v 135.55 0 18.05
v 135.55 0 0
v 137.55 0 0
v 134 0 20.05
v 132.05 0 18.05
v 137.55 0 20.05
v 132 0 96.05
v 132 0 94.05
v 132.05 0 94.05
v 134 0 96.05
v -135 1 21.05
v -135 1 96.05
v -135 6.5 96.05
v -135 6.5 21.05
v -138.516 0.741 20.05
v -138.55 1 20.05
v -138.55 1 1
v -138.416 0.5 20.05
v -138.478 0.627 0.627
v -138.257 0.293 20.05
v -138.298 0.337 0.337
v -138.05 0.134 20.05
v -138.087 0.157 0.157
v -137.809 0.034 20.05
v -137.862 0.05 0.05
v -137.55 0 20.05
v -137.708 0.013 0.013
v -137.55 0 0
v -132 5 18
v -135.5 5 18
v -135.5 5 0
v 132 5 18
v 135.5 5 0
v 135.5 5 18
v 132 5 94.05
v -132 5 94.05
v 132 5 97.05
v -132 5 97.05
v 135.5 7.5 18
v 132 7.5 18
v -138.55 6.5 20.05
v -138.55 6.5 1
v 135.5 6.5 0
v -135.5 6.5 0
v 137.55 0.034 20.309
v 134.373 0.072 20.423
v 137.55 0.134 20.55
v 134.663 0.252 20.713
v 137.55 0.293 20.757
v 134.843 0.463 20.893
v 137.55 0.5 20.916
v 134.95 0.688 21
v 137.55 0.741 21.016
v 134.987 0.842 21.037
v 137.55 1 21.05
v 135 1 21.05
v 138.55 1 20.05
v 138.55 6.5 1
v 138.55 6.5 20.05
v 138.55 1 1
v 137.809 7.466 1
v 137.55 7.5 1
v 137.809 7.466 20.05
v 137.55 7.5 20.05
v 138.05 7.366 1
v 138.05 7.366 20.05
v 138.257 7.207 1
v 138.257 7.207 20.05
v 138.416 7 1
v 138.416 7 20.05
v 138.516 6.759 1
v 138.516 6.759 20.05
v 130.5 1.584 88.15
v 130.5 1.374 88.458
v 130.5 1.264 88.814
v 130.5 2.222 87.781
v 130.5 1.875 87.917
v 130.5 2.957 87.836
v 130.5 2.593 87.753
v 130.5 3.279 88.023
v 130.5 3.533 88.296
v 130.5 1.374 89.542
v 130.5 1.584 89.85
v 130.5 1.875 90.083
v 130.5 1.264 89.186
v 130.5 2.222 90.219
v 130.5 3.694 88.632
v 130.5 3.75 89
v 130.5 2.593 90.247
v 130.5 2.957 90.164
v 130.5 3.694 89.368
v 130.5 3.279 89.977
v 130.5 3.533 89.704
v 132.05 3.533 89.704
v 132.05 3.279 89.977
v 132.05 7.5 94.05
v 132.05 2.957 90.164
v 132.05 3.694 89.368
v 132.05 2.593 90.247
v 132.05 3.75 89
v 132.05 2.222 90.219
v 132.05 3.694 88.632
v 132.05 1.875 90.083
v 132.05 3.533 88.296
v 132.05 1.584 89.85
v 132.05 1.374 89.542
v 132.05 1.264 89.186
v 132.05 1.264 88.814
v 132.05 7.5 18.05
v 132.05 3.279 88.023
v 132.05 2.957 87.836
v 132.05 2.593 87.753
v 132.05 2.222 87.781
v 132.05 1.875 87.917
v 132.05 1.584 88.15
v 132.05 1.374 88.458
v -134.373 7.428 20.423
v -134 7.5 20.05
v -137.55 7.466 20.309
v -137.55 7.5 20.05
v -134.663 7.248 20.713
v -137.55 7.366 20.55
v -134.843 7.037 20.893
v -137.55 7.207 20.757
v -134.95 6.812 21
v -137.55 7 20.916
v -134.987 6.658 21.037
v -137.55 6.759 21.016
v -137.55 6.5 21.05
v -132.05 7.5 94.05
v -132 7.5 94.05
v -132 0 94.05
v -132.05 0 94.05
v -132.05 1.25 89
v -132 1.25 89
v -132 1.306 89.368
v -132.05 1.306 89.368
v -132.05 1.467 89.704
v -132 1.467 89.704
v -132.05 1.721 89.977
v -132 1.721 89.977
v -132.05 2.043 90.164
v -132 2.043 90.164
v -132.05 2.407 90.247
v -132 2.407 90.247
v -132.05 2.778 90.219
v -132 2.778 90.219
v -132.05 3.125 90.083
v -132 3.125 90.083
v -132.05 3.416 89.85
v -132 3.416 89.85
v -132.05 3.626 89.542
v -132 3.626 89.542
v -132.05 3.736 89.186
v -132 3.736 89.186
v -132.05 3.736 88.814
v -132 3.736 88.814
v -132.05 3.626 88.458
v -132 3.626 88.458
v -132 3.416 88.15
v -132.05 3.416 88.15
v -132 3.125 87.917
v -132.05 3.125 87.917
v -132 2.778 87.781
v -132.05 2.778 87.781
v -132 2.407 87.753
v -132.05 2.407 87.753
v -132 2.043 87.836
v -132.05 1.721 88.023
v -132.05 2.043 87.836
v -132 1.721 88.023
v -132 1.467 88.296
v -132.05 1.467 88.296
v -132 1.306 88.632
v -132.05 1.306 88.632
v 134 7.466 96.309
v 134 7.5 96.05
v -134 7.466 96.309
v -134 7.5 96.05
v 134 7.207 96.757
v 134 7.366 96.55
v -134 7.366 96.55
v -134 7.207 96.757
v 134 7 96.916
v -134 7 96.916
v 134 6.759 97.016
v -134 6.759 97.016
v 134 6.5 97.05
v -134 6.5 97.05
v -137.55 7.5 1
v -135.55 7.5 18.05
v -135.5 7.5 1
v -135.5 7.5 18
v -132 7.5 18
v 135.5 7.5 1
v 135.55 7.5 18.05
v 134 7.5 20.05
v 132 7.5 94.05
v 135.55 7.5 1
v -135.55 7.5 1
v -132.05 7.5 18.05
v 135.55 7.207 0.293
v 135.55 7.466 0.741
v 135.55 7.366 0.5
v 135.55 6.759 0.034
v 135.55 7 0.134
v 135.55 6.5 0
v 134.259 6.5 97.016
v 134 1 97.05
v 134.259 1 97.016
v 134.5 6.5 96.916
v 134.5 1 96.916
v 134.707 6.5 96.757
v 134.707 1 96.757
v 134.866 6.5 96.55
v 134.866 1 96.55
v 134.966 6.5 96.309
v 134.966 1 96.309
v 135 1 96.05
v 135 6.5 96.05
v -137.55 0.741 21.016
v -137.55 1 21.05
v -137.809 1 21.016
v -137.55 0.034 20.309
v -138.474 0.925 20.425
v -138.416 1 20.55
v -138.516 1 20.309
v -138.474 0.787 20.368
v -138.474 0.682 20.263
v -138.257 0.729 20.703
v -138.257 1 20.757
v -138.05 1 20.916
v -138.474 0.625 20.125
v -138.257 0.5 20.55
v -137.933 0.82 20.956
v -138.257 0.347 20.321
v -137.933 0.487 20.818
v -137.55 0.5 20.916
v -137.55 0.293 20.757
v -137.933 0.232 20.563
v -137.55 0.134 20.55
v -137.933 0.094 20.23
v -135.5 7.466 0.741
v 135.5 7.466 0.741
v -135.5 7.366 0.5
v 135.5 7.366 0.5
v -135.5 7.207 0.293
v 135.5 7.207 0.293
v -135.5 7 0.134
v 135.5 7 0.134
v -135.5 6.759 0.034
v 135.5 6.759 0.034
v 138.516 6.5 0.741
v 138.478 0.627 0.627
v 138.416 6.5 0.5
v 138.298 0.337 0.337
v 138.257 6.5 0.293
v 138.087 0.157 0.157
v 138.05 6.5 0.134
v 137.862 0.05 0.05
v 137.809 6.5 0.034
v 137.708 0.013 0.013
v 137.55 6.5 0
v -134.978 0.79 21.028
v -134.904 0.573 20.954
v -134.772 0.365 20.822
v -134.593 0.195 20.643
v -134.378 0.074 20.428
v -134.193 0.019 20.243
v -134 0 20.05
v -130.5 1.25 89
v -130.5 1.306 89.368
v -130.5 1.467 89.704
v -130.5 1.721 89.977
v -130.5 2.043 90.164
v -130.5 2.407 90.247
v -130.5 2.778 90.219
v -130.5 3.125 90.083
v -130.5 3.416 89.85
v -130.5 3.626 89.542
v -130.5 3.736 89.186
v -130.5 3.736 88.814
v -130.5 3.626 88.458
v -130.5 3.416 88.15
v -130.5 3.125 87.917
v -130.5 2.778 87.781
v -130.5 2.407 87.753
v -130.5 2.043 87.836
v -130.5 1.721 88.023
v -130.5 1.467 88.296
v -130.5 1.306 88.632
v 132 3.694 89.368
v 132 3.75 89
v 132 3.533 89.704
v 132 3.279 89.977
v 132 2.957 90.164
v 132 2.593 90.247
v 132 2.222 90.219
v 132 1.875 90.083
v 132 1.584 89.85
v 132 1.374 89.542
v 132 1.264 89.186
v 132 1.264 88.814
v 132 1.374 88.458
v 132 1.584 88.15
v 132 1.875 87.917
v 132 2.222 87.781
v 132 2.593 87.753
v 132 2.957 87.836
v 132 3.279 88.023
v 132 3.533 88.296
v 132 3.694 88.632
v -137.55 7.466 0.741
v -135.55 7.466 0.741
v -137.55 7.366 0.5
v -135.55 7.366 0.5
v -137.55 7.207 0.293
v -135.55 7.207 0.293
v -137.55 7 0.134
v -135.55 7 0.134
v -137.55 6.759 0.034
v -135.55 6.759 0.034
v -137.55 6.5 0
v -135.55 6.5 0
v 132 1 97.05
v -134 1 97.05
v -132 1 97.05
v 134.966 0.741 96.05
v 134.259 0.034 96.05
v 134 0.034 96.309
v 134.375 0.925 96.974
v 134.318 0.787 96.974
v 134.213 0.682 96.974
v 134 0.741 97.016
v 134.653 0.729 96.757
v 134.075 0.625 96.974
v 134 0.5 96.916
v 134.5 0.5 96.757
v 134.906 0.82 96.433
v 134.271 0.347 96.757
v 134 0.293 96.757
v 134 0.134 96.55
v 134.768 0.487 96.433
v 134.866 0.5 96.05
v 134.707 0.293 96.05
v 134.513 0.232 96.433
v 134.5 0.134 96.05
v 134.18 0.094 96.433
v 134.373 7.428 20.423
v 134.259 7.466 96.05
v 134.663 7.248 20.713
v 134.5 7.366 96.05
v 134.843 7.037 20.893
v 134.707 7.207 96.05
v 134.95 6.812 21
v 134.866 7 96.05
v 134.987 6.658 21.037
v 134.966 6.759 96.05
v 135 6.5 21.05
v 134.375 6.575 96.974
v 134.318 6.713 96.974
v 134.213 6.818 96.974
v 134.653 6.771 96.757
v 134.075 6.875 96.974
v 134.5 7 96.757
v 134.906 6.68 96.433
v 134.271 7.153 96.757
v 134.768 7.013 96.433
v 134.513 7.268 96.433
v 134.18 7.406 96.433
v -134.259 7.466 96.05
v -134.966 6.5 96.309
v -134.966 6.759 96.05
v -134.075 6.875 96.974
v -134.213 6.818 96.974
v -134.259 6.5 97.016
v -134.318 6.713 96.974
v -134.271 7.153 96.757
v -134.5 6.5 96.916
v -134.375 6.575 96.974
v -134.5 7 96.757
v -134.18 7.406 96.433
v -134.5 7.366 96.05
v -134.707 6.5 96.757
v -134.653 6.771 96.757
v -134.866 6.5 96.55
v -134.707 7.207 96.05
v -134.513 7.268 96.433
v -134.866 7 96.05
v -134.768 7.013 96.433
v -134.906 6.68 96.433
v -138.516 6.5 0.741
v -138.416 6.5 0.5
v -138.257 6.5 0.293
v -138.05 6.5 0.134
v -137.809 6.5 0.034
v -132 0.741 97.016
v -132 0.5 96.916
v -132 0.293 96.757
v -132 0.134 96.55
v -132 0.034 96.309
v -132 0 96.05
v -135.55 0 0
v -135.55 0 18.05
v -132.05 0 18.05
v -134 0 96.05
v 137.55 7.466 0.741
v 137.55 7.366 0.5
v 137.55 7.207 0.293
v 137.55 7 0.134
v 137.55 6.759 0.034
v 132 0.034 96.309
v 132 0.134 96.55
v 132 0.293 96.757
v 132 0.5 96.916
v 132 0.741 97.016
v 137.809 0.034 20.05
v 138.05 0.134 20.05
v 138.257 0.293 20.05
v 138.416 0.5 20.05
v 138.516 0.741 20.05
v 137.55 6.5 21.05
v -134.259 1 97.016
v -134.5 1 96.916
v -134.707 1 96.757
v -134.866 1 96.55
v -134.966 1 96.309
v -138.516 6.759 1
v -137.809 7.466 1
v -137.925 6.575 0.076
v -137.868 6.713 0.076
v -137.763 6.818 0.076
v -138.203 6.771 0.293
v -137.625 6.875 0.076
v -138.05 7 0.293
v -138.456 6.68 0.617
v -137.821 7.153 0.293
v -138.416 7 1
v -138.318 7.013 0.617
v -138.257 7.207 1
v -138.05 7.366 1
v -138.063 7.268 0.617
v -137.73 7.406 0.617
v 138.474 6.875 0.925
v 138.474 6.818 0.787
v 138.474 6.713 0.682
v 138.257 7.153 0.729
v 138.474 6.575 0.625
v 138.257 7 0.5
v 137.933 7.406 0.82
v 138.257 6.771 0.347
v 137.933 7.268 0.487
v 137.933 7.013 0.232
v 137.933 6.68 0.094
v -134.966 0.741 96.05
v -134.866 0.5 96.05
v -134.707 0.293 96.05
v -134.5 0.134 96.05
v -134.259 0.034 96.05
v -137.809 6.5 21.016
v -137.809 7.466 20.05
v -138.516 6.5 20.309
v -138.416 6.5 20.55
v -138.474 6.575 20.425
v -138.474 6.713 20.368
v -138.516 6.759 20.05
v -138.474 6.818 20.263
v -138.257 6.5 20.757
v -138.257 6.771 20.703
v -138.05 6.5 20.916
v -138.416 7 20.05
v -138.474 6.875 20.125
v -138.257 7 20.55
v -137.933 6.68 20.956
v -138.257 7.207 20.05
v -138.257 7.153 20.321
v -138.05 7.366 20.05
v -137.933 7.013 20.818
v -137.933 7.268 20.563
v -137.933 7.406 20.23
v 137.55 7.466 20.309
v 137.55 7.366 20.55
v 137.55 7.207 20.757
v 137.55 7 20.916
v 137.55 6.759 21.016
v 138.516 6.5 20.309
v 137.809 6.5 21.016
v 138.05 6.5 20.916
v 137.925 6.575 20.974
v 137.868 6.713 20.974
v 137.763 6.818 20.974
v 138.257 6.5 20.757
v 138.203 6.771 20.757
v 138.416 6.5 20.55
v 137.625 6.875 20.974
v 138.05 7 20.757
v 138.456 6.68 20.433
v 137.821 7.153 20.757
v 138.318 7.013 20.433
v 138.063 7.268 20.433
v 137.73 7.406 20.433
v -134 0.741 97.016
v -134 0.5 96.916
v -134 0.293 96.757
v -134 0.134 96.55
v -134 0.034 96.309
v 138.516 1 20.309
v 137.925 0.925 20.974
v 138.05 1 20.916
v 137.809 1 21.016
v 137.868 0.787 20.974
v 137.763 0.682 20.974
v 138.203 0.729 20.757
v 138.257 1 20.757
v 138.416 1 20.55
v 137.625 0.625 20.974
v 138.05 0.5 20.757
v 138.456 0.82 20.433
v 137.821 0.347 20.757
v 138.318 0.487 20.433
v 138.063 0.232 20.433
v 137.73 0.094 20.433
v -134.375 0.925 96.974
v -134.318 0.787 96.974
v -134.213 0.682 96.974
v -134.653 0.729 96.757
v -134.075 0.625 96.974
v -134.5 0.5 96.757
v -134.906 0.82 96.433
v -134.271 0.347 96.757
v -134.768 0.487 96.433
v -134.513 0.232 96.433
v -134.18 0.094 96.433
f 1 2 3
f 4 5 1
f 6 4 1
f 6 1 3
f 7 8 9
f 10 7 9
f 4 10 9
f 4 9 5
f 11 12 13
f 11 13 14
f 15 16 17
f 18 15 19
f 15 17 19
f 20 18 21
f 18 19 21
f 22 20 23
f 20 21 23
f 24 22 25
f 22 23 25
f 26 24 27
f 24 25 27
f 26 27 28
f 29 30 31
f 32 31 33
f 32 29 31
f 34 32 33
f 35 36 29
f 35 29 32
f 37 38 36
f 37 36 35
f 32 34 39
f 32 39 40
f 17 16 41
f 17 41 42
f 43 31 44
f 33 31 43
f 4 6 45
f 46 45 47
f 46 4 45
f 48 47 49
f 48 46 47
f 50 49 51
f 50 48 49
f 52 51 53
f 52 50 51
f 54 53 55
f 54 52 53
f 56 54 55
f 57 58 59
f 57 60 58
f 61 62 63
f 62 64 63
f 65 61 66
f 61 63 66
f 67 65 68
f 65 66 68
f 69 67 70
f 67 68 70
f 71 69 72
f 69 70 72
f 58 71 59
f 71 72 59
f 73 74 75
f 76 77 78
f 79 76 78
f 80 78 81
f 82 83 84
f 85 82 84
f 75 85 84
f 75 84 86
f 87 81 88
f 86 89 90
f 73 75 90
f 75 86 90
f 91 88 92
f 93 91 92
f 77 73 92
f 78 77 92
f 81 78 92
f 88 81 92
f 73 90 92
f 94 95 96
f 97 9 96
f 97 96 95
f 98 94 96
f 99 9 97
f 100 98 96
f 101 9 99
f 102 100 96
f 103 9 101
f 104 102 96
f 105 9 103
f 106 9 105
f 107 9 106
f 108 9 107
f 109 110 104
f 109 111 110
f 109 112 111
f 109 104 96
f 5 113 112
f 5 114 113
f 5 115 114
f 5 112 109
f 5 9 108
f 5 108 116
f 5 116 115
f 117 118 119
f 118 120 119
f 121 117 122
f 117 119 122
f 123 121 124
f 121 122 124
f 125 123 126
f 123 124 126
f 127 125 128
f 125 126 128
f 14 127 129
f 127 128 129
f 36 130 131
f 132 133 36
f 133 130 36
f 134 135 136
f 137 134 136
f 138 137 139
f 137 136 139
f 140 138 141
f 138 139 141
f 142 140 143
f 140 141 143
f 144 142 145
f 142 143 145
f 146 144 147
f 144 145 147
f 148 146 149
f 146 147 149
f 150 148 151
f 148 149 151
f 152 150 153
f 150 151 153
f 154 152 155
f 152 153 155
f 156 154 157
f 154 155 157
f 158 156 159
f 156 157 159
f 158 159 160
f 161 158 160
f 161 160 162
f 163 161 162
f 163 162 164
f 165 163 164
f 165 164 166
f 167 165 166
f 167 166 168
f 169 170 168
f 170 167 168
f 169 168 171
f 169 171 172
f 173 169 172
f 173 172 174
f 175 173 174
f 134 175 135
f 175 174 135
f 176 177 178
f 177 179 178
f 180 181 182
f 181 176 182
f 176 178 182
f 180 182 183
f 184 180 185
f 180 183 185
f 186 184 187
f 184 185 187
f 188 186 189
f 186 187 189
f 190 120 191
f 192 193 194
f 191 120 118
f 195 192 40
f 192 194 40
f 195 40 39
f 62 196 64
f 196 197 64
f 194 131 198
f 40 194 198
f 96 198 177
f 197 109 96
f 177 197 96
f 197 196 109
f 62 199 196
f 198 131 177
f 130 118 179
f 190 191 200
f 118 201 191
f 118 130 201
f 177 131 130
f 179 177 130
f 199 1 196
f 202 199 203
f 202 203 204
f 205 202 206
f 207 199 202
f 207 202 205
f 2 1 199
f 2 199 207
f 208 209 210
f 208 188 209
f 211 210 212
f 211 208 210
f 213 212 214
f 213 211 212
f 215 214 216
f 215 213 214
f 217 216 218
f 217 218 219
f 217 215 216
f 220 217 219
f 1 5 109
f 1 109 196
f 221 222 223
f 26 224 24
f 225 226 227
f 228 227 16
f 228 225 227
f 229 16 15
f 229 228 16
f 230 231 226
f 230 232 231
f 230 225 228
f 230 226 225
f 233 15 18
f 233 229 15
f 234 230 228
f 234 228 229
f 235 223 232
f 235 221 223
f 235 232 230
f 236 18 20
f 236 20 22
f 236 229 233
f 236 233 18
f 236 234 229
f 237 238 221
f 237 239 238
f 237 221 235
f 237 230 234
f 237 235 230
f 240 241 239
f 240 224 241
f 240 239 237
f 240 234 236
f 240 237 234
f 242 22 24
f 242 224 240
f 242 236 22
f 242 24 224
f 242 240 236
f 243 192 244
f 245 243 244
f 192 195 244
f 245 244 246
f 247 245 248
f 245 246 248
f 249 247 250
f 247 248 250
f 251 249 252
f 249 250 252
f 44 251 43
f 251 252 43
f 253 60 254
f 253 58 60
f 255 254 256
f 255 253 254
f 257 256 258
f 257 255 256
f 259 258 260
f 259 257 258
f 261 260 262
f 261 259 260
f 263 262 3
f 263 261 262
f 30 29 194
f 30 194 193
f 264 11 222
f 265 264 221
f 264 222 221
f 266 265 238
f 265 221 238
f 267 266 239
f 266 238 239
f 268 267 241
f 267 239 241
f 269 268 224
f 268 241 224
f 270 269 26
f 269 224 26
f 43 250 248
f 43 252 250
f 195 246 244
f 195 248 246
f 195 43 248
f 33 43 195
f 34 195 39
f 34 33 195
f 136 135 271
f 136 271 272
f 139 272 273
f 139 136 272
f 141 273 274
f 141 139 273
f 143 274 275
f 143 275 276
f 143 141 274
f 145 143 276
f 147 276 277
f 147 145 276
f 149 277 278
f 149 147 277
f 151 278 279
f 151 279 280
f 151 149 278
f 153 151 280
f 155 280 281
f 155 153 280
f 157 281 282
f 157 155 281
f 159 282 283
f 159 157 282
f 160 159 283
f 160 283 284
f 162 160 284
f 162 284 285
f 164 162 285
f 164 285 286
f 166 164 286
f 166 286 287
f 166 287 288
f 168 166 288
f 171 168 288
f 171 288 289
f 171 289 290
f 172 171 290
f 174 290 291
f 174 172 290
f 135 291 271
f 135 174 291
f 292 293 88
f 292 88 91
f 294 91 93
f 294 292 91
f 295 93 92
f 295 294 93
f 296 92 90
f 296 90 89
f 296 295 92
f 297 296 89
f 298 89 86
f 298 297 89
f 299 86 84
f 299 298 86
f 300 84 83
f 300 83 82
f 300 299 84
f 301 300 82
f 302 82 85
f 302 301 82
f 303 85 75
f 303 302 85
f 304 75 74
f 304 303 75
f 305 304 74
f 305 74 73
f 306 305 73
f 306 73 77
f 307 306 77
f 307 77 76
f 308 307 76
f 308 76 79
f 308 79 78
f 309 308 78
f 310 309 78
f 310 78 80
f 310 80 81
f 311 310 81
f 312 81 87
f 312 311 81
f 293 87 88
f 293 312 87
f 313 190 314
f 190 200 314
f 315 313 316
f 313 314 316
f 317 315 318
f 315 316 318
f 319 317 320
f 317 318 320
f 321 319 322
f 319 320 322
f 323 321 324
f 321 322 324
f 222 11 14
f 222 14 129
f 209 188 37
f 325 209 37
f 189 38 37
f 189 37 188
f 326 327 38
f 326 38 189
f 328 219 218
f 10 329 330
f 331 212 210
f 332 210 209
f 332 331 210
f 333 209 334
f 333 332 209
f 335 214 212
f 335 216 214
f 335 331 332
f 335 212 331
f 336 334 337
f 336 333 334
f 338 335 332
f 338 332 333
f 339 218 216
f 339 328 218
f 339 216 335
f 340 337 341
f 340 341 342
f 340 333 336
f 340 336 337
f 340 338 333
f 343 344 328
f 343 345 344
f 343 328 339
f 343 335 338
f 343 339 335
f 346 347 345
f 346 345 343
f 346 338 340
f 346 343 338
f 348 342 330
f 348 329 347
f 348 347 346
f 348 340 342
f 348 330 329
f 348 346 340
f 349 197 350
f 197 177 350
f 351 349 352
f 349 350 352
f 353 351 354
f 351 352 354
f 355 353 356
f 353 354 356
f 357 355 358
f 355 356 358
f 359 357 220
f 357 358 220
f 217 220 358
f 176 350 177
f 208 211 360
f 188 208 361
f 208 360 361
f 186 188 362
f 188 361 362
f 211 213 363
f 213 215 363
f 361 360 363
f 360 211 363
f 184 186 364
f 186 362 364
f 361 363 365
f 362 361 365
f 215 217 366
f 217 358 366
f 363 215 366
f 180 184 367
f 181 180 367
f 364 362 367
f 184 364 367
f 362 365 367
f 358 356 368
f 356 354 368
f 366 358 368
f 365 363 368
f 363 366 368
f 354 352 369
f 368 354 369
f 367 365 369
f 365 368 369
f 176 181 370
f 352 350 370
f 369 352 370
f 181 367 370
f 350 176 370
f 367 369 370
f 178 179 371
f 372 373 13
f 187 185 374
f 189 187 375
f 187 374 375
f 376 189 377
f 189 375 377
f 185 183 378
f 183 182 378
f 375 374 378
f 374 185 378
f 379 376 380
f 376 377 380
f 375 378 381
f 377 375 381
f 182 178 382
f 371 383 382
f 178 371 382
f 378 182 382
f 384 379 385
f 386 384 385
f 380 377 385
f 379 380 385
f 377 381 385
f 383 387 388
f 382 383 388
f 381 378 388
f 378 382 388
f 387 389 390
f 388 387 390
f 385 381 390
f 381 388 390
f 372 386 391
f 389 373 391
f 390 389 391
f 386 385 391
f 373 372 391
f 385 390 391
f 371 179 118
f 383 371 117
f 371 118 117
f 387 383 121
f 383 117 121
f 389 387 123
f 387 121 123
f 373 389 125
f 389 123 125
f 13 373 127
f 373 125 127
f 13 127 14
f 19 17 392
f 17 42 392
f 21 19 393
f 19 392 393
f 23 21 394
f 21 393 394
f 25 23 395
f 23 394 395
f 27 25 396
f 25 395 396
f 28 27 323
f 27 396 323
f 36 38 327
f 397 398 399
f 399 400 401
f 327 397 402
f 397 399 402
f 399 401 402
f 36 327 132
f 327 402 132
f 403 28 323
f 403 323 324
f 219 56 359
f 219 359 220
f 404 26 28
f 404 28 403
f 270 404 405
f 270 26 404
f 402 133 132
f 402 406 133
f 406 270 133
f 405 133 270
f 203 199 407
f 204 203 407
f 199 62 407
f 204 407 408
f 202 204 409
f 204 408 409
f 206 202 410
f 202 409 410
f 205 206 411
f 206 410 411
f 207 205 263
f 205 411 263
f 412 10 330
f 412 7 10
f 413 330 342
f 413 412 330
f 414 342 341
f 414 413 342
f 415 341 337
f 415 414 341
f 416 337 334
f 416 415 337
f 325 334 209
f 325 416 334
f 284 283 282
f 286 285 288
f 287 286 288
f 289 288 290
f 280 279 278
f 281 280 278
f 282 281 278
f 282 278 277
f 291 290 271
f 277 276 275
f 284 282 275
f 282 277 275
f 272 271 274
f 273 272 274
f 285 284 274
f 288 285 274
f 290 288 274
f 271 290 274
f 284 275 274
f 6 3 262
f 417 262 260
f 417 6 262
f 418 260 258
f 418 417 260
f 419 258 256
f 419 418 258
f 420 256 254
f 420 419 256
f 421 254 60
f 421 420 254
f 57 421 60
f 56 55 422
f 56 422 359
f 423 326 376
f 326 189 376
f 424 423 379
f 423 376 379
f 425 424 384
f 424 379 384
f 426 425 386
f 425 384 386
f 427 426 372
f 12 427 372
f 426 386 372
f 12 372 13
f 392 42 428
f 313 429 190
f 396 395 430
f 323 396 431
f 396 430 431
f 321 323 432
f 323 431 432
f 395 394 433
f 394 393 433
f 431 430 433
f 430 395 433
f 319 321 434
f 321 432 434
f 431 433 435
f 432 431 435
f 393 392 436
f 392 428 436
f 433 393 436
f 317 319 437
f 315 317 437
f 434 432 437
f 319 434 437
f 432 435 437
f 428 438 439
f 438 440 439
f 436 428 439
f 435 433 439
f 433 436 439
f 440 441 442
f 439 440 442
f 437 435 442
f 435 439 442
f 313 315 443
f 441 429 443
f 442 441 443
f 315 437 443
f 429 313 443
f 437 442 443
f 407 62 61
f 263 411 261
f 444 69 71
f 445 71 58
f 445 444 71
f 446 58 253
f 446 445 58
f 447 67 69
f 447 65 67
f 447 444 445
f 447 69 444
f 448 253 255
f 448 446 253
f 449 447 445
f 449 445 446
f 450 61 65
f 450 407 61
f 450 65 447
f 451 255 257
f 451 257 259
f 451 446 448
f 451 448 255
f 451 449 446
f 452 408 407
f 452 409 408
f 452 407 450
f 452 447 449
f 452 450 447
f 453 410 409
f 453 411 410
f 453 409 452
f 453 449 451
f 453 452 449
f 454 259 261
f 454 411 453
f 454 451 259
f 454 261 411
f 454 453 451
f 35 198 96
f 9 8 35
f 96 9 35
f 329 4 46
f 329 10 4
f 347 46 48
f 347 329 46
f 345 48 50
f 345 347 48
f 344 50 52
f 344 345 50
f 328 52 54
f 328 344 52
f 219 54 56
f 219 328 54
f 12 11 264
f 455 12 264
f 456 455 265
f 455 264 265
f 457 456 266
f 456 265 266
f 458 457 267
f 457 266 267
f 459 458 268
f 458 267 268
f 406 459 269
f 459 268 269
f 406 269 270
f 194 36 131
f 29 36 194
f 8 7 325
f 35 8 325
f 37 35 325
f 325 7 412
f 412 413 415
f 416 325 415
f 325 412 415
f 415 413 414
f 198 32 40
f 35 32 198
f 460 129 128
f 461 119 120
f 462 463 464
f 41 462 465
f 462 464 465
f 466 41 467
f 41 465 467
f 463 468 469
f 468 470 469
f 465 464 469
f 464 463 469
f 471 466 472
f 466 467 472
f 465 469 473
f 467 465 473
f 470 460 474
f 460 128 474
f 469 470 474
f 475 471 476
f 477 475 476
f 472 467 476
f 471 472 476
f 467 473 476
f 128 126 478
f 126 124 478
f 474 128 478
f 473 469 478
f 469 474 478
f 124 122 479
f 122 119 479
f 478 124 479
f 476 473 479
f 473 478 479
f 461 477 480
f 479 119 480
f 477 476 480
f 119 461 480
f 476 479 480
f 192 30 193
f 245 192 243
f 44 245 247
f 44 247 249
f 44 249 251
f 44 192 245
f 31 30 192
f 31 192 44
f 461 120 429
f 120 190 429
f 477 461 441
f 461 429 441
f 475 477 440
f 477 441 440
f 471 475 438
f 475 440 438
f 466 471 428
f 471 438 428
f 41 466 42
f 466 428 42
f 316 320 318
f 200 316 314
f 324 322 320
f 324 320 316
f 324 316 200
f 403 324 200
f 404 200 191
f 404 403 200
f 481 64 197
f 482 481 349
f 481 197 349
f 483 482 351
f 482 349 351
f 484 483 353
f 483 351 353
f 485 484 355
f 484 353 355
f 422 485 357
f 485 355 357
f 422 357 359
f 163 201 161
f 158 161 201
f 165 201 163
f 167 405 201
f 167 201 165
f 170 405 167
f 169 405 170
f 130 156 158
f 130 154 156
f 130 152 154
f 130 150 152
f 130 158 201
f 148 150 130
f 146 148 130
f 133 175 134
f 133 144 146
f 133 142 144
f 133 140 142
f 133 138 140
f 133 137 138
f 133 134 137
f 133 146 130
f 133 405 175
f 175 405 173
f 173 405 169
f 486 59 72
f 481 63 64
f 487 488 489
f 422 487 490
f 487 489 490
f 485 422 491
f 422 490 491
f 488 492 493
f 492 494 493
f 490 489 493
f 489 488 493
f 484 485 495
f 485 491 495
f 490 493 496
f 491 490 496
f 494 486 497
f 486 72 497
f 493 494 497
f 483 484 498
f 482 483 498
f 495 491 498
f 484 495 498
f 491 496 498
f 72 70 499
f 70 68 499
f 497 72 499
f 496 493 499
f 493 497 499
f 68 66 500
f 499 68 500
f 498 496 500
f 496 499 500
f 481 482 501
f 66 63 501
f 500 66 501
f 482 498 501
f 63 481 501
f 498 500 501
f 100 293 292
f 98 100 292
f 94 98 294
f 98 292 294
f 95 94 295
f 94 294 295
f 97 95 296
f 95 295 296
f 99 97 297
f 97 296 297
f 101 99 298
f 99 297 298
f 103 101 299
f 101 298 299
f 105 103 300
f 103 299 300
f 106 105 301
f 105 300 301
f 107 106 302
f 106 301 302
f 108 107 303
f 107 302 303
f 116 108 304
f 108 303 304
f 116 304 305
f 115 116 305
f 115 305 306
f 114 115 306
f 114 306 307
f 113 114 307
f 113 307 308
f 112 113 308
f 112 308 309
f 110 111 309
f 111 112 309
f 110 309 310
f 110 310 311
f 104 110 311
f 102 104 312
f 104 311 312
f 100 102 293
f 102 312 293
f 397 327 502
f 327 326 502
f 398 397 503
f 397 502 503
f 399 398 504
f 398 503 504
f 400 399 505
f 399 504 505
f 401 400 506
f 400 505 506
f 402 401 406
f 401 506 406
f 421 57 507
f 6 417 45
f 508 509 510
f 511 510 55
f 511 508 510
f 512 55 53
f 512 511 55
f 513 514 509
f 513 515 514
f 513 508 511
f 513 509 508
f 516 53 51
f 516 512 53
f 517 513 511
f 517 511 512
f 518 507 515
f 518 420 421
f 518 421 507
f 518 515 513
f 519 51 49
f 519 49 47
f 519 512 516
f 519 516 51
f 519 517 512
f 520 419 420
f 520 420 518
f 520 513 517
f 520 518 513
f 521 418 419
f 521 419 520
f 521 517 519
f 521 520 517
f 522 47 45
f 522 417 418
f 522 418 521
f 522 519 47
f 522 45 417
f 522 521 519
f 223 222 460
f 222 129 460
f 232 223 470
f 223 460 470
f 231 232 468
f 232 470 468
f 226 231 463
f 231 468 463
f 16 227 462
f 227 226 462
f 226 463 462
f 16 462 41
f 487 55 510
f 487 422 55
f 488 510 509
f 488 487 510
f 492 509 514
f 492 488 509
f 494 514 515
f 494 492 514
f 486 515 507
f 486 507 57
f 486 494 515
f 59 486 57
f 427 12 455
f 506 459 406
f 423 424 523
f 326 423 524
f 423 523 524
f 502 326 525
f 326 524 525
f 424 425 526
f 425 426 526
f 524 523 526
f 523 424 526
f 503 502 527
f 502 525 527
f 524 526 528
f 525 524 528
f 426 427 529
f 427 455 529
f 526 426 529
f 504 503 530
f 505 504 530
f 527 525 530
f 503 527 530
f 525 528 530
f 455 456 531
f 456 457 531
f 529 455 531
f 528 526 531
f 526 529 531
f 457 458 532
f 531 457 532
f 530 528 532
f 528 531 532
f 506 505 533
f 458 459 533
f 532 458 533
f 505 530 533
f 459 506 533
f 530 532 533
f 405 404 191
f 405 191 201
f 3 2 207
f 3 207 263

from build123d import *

# Parameters (mm, degrees)
F1_DEPTH = 5
F5_DEPTH = 7.5
F6_DEPTH = 2.5
F7_DEPTH = 5
F3_R     = 1.25
F4_R     = 1.25
F8_DEPTH = 1.5
F9_DEPTH = 1.5
F10_R    = 1


with BuildPart() as f1:
    # F0 (on Front) → F1 (new body)
    with BuildSketch(Plane.XZ):
        Polygon((-135.5, 0), (0, 0), (135.5, 0), (135.5, 18), (132, 18), (132, 160), (-132, 160), (-132, 18), (-135.5, 18), align=None)
    extrude(amount=-F1_DEPTH)

    # F2 (on face) → F5 (join)
    with BuildSketch(Plane.XZ):
        Polygon((-138.55, 0), (-135.55, 0), (-135.55, 18.05), (-132.05, 18.05), (-132.05, 94.05), (132.05, 94.05), (132.05, 18.05), (135.55, 18.05), (135.55, 0), (138.55, 0), (138.55, 21.05), (135, 21.05), (135, 97.05), (-135, 97.05), (-135, 21.05), (-138.55, 21.05), align=None)
    extrude(amount=-F5_DEPTH)

    # F6 (add): a face of the model
    f6_faces = [f1.faces().sort_by_distance(p)[0] for p in [
        (0, 5, 46.8330099538),
    ]]
    extrude(f6_faces, amount=F6_DEPTH)

    # F0 (on Front) → F7 (cut)
    with BuildSketch(Plane.XZ):
        Polygon((-135.5, 0), (0, 0), (135.5, 0), (135.5, 18), (132, 18), (132, 160), (-132, 160), (-132, 18), (-135.5, 18), align=None)
    extrude(amount=-F7_DEPTH, mode=Mode.SUBTRACT)

    # F3 (on face) + F4 (on face) → F8 (join)
    with BuildSketch(Plane.YZ.offset(132)):
        with Locations((2.5, 89)):
            Circle(F3_R)
    with BuildSketch(Plane(origin=(-132, 0, 0), x_dir=(0, -1, 0), z_dir=(-1, 0, 0))):
        with Locations((-2.5, 89)):
            Circle(F4_R)
    extrude(amount=F8_DEPTH, dir=(1, 0, 0))

    # F3 (on face) + F4 (on face) → F9 (join)
    with BuildSketch(Plane.YZ.offset(132)):
        with Locations((2.5, 89)):
            Circle(F3_R)
    with BuildSketch(Plane(origin=(-132, 0, 0), x_dir=(0, -1, 0), z_dir=(-1, 0, 0))):
        with Locations((-2.5, 89)):
            Circle(F4_R)
    extrude(amount=-F9_DEPTH, dir=(1, 0, 0))

    # F10
    f10_edges = [f1.edges().sort_by_distance(p)[0] for p in [
        (-135, 0, 59.05),
        (-135, 7.5, 59.05),
        (135, 7.5, 59.05),
        (135, 0, 59.05),
        (135, 3.75, 97.05),
        (0, 7.5, 97.05),
        (-135, 3.75, 97.05),
        (-136.775, 0, 21.05),
        (-136.775, 7.5, 21.05),
        (-138.55, 3.75, 21.05),
        (-138.55, 0, 10.525),
        (-138.55, 7.5, 10.525),
        (-138.55, 3.75, 0),
        (0, 7.5, 0),
        (-137.05, 7.5, 0),
        (137.05, 7.5, 0),
        (138.55, 7.5, 10.525),
        (138.55, 3.75, 0),
        (138.55, 0, 10.525),
        (138.55, 3.75, 21.05),
        (136.775, 0, 21.05),
        (136.775, 7.5, 21.05),
        (133.5, 0, 97.05),
        (-133.5, 0, 97.05),
    ]]
    fillet(f10_edges, radius=F10_R)


solid = f1.part
